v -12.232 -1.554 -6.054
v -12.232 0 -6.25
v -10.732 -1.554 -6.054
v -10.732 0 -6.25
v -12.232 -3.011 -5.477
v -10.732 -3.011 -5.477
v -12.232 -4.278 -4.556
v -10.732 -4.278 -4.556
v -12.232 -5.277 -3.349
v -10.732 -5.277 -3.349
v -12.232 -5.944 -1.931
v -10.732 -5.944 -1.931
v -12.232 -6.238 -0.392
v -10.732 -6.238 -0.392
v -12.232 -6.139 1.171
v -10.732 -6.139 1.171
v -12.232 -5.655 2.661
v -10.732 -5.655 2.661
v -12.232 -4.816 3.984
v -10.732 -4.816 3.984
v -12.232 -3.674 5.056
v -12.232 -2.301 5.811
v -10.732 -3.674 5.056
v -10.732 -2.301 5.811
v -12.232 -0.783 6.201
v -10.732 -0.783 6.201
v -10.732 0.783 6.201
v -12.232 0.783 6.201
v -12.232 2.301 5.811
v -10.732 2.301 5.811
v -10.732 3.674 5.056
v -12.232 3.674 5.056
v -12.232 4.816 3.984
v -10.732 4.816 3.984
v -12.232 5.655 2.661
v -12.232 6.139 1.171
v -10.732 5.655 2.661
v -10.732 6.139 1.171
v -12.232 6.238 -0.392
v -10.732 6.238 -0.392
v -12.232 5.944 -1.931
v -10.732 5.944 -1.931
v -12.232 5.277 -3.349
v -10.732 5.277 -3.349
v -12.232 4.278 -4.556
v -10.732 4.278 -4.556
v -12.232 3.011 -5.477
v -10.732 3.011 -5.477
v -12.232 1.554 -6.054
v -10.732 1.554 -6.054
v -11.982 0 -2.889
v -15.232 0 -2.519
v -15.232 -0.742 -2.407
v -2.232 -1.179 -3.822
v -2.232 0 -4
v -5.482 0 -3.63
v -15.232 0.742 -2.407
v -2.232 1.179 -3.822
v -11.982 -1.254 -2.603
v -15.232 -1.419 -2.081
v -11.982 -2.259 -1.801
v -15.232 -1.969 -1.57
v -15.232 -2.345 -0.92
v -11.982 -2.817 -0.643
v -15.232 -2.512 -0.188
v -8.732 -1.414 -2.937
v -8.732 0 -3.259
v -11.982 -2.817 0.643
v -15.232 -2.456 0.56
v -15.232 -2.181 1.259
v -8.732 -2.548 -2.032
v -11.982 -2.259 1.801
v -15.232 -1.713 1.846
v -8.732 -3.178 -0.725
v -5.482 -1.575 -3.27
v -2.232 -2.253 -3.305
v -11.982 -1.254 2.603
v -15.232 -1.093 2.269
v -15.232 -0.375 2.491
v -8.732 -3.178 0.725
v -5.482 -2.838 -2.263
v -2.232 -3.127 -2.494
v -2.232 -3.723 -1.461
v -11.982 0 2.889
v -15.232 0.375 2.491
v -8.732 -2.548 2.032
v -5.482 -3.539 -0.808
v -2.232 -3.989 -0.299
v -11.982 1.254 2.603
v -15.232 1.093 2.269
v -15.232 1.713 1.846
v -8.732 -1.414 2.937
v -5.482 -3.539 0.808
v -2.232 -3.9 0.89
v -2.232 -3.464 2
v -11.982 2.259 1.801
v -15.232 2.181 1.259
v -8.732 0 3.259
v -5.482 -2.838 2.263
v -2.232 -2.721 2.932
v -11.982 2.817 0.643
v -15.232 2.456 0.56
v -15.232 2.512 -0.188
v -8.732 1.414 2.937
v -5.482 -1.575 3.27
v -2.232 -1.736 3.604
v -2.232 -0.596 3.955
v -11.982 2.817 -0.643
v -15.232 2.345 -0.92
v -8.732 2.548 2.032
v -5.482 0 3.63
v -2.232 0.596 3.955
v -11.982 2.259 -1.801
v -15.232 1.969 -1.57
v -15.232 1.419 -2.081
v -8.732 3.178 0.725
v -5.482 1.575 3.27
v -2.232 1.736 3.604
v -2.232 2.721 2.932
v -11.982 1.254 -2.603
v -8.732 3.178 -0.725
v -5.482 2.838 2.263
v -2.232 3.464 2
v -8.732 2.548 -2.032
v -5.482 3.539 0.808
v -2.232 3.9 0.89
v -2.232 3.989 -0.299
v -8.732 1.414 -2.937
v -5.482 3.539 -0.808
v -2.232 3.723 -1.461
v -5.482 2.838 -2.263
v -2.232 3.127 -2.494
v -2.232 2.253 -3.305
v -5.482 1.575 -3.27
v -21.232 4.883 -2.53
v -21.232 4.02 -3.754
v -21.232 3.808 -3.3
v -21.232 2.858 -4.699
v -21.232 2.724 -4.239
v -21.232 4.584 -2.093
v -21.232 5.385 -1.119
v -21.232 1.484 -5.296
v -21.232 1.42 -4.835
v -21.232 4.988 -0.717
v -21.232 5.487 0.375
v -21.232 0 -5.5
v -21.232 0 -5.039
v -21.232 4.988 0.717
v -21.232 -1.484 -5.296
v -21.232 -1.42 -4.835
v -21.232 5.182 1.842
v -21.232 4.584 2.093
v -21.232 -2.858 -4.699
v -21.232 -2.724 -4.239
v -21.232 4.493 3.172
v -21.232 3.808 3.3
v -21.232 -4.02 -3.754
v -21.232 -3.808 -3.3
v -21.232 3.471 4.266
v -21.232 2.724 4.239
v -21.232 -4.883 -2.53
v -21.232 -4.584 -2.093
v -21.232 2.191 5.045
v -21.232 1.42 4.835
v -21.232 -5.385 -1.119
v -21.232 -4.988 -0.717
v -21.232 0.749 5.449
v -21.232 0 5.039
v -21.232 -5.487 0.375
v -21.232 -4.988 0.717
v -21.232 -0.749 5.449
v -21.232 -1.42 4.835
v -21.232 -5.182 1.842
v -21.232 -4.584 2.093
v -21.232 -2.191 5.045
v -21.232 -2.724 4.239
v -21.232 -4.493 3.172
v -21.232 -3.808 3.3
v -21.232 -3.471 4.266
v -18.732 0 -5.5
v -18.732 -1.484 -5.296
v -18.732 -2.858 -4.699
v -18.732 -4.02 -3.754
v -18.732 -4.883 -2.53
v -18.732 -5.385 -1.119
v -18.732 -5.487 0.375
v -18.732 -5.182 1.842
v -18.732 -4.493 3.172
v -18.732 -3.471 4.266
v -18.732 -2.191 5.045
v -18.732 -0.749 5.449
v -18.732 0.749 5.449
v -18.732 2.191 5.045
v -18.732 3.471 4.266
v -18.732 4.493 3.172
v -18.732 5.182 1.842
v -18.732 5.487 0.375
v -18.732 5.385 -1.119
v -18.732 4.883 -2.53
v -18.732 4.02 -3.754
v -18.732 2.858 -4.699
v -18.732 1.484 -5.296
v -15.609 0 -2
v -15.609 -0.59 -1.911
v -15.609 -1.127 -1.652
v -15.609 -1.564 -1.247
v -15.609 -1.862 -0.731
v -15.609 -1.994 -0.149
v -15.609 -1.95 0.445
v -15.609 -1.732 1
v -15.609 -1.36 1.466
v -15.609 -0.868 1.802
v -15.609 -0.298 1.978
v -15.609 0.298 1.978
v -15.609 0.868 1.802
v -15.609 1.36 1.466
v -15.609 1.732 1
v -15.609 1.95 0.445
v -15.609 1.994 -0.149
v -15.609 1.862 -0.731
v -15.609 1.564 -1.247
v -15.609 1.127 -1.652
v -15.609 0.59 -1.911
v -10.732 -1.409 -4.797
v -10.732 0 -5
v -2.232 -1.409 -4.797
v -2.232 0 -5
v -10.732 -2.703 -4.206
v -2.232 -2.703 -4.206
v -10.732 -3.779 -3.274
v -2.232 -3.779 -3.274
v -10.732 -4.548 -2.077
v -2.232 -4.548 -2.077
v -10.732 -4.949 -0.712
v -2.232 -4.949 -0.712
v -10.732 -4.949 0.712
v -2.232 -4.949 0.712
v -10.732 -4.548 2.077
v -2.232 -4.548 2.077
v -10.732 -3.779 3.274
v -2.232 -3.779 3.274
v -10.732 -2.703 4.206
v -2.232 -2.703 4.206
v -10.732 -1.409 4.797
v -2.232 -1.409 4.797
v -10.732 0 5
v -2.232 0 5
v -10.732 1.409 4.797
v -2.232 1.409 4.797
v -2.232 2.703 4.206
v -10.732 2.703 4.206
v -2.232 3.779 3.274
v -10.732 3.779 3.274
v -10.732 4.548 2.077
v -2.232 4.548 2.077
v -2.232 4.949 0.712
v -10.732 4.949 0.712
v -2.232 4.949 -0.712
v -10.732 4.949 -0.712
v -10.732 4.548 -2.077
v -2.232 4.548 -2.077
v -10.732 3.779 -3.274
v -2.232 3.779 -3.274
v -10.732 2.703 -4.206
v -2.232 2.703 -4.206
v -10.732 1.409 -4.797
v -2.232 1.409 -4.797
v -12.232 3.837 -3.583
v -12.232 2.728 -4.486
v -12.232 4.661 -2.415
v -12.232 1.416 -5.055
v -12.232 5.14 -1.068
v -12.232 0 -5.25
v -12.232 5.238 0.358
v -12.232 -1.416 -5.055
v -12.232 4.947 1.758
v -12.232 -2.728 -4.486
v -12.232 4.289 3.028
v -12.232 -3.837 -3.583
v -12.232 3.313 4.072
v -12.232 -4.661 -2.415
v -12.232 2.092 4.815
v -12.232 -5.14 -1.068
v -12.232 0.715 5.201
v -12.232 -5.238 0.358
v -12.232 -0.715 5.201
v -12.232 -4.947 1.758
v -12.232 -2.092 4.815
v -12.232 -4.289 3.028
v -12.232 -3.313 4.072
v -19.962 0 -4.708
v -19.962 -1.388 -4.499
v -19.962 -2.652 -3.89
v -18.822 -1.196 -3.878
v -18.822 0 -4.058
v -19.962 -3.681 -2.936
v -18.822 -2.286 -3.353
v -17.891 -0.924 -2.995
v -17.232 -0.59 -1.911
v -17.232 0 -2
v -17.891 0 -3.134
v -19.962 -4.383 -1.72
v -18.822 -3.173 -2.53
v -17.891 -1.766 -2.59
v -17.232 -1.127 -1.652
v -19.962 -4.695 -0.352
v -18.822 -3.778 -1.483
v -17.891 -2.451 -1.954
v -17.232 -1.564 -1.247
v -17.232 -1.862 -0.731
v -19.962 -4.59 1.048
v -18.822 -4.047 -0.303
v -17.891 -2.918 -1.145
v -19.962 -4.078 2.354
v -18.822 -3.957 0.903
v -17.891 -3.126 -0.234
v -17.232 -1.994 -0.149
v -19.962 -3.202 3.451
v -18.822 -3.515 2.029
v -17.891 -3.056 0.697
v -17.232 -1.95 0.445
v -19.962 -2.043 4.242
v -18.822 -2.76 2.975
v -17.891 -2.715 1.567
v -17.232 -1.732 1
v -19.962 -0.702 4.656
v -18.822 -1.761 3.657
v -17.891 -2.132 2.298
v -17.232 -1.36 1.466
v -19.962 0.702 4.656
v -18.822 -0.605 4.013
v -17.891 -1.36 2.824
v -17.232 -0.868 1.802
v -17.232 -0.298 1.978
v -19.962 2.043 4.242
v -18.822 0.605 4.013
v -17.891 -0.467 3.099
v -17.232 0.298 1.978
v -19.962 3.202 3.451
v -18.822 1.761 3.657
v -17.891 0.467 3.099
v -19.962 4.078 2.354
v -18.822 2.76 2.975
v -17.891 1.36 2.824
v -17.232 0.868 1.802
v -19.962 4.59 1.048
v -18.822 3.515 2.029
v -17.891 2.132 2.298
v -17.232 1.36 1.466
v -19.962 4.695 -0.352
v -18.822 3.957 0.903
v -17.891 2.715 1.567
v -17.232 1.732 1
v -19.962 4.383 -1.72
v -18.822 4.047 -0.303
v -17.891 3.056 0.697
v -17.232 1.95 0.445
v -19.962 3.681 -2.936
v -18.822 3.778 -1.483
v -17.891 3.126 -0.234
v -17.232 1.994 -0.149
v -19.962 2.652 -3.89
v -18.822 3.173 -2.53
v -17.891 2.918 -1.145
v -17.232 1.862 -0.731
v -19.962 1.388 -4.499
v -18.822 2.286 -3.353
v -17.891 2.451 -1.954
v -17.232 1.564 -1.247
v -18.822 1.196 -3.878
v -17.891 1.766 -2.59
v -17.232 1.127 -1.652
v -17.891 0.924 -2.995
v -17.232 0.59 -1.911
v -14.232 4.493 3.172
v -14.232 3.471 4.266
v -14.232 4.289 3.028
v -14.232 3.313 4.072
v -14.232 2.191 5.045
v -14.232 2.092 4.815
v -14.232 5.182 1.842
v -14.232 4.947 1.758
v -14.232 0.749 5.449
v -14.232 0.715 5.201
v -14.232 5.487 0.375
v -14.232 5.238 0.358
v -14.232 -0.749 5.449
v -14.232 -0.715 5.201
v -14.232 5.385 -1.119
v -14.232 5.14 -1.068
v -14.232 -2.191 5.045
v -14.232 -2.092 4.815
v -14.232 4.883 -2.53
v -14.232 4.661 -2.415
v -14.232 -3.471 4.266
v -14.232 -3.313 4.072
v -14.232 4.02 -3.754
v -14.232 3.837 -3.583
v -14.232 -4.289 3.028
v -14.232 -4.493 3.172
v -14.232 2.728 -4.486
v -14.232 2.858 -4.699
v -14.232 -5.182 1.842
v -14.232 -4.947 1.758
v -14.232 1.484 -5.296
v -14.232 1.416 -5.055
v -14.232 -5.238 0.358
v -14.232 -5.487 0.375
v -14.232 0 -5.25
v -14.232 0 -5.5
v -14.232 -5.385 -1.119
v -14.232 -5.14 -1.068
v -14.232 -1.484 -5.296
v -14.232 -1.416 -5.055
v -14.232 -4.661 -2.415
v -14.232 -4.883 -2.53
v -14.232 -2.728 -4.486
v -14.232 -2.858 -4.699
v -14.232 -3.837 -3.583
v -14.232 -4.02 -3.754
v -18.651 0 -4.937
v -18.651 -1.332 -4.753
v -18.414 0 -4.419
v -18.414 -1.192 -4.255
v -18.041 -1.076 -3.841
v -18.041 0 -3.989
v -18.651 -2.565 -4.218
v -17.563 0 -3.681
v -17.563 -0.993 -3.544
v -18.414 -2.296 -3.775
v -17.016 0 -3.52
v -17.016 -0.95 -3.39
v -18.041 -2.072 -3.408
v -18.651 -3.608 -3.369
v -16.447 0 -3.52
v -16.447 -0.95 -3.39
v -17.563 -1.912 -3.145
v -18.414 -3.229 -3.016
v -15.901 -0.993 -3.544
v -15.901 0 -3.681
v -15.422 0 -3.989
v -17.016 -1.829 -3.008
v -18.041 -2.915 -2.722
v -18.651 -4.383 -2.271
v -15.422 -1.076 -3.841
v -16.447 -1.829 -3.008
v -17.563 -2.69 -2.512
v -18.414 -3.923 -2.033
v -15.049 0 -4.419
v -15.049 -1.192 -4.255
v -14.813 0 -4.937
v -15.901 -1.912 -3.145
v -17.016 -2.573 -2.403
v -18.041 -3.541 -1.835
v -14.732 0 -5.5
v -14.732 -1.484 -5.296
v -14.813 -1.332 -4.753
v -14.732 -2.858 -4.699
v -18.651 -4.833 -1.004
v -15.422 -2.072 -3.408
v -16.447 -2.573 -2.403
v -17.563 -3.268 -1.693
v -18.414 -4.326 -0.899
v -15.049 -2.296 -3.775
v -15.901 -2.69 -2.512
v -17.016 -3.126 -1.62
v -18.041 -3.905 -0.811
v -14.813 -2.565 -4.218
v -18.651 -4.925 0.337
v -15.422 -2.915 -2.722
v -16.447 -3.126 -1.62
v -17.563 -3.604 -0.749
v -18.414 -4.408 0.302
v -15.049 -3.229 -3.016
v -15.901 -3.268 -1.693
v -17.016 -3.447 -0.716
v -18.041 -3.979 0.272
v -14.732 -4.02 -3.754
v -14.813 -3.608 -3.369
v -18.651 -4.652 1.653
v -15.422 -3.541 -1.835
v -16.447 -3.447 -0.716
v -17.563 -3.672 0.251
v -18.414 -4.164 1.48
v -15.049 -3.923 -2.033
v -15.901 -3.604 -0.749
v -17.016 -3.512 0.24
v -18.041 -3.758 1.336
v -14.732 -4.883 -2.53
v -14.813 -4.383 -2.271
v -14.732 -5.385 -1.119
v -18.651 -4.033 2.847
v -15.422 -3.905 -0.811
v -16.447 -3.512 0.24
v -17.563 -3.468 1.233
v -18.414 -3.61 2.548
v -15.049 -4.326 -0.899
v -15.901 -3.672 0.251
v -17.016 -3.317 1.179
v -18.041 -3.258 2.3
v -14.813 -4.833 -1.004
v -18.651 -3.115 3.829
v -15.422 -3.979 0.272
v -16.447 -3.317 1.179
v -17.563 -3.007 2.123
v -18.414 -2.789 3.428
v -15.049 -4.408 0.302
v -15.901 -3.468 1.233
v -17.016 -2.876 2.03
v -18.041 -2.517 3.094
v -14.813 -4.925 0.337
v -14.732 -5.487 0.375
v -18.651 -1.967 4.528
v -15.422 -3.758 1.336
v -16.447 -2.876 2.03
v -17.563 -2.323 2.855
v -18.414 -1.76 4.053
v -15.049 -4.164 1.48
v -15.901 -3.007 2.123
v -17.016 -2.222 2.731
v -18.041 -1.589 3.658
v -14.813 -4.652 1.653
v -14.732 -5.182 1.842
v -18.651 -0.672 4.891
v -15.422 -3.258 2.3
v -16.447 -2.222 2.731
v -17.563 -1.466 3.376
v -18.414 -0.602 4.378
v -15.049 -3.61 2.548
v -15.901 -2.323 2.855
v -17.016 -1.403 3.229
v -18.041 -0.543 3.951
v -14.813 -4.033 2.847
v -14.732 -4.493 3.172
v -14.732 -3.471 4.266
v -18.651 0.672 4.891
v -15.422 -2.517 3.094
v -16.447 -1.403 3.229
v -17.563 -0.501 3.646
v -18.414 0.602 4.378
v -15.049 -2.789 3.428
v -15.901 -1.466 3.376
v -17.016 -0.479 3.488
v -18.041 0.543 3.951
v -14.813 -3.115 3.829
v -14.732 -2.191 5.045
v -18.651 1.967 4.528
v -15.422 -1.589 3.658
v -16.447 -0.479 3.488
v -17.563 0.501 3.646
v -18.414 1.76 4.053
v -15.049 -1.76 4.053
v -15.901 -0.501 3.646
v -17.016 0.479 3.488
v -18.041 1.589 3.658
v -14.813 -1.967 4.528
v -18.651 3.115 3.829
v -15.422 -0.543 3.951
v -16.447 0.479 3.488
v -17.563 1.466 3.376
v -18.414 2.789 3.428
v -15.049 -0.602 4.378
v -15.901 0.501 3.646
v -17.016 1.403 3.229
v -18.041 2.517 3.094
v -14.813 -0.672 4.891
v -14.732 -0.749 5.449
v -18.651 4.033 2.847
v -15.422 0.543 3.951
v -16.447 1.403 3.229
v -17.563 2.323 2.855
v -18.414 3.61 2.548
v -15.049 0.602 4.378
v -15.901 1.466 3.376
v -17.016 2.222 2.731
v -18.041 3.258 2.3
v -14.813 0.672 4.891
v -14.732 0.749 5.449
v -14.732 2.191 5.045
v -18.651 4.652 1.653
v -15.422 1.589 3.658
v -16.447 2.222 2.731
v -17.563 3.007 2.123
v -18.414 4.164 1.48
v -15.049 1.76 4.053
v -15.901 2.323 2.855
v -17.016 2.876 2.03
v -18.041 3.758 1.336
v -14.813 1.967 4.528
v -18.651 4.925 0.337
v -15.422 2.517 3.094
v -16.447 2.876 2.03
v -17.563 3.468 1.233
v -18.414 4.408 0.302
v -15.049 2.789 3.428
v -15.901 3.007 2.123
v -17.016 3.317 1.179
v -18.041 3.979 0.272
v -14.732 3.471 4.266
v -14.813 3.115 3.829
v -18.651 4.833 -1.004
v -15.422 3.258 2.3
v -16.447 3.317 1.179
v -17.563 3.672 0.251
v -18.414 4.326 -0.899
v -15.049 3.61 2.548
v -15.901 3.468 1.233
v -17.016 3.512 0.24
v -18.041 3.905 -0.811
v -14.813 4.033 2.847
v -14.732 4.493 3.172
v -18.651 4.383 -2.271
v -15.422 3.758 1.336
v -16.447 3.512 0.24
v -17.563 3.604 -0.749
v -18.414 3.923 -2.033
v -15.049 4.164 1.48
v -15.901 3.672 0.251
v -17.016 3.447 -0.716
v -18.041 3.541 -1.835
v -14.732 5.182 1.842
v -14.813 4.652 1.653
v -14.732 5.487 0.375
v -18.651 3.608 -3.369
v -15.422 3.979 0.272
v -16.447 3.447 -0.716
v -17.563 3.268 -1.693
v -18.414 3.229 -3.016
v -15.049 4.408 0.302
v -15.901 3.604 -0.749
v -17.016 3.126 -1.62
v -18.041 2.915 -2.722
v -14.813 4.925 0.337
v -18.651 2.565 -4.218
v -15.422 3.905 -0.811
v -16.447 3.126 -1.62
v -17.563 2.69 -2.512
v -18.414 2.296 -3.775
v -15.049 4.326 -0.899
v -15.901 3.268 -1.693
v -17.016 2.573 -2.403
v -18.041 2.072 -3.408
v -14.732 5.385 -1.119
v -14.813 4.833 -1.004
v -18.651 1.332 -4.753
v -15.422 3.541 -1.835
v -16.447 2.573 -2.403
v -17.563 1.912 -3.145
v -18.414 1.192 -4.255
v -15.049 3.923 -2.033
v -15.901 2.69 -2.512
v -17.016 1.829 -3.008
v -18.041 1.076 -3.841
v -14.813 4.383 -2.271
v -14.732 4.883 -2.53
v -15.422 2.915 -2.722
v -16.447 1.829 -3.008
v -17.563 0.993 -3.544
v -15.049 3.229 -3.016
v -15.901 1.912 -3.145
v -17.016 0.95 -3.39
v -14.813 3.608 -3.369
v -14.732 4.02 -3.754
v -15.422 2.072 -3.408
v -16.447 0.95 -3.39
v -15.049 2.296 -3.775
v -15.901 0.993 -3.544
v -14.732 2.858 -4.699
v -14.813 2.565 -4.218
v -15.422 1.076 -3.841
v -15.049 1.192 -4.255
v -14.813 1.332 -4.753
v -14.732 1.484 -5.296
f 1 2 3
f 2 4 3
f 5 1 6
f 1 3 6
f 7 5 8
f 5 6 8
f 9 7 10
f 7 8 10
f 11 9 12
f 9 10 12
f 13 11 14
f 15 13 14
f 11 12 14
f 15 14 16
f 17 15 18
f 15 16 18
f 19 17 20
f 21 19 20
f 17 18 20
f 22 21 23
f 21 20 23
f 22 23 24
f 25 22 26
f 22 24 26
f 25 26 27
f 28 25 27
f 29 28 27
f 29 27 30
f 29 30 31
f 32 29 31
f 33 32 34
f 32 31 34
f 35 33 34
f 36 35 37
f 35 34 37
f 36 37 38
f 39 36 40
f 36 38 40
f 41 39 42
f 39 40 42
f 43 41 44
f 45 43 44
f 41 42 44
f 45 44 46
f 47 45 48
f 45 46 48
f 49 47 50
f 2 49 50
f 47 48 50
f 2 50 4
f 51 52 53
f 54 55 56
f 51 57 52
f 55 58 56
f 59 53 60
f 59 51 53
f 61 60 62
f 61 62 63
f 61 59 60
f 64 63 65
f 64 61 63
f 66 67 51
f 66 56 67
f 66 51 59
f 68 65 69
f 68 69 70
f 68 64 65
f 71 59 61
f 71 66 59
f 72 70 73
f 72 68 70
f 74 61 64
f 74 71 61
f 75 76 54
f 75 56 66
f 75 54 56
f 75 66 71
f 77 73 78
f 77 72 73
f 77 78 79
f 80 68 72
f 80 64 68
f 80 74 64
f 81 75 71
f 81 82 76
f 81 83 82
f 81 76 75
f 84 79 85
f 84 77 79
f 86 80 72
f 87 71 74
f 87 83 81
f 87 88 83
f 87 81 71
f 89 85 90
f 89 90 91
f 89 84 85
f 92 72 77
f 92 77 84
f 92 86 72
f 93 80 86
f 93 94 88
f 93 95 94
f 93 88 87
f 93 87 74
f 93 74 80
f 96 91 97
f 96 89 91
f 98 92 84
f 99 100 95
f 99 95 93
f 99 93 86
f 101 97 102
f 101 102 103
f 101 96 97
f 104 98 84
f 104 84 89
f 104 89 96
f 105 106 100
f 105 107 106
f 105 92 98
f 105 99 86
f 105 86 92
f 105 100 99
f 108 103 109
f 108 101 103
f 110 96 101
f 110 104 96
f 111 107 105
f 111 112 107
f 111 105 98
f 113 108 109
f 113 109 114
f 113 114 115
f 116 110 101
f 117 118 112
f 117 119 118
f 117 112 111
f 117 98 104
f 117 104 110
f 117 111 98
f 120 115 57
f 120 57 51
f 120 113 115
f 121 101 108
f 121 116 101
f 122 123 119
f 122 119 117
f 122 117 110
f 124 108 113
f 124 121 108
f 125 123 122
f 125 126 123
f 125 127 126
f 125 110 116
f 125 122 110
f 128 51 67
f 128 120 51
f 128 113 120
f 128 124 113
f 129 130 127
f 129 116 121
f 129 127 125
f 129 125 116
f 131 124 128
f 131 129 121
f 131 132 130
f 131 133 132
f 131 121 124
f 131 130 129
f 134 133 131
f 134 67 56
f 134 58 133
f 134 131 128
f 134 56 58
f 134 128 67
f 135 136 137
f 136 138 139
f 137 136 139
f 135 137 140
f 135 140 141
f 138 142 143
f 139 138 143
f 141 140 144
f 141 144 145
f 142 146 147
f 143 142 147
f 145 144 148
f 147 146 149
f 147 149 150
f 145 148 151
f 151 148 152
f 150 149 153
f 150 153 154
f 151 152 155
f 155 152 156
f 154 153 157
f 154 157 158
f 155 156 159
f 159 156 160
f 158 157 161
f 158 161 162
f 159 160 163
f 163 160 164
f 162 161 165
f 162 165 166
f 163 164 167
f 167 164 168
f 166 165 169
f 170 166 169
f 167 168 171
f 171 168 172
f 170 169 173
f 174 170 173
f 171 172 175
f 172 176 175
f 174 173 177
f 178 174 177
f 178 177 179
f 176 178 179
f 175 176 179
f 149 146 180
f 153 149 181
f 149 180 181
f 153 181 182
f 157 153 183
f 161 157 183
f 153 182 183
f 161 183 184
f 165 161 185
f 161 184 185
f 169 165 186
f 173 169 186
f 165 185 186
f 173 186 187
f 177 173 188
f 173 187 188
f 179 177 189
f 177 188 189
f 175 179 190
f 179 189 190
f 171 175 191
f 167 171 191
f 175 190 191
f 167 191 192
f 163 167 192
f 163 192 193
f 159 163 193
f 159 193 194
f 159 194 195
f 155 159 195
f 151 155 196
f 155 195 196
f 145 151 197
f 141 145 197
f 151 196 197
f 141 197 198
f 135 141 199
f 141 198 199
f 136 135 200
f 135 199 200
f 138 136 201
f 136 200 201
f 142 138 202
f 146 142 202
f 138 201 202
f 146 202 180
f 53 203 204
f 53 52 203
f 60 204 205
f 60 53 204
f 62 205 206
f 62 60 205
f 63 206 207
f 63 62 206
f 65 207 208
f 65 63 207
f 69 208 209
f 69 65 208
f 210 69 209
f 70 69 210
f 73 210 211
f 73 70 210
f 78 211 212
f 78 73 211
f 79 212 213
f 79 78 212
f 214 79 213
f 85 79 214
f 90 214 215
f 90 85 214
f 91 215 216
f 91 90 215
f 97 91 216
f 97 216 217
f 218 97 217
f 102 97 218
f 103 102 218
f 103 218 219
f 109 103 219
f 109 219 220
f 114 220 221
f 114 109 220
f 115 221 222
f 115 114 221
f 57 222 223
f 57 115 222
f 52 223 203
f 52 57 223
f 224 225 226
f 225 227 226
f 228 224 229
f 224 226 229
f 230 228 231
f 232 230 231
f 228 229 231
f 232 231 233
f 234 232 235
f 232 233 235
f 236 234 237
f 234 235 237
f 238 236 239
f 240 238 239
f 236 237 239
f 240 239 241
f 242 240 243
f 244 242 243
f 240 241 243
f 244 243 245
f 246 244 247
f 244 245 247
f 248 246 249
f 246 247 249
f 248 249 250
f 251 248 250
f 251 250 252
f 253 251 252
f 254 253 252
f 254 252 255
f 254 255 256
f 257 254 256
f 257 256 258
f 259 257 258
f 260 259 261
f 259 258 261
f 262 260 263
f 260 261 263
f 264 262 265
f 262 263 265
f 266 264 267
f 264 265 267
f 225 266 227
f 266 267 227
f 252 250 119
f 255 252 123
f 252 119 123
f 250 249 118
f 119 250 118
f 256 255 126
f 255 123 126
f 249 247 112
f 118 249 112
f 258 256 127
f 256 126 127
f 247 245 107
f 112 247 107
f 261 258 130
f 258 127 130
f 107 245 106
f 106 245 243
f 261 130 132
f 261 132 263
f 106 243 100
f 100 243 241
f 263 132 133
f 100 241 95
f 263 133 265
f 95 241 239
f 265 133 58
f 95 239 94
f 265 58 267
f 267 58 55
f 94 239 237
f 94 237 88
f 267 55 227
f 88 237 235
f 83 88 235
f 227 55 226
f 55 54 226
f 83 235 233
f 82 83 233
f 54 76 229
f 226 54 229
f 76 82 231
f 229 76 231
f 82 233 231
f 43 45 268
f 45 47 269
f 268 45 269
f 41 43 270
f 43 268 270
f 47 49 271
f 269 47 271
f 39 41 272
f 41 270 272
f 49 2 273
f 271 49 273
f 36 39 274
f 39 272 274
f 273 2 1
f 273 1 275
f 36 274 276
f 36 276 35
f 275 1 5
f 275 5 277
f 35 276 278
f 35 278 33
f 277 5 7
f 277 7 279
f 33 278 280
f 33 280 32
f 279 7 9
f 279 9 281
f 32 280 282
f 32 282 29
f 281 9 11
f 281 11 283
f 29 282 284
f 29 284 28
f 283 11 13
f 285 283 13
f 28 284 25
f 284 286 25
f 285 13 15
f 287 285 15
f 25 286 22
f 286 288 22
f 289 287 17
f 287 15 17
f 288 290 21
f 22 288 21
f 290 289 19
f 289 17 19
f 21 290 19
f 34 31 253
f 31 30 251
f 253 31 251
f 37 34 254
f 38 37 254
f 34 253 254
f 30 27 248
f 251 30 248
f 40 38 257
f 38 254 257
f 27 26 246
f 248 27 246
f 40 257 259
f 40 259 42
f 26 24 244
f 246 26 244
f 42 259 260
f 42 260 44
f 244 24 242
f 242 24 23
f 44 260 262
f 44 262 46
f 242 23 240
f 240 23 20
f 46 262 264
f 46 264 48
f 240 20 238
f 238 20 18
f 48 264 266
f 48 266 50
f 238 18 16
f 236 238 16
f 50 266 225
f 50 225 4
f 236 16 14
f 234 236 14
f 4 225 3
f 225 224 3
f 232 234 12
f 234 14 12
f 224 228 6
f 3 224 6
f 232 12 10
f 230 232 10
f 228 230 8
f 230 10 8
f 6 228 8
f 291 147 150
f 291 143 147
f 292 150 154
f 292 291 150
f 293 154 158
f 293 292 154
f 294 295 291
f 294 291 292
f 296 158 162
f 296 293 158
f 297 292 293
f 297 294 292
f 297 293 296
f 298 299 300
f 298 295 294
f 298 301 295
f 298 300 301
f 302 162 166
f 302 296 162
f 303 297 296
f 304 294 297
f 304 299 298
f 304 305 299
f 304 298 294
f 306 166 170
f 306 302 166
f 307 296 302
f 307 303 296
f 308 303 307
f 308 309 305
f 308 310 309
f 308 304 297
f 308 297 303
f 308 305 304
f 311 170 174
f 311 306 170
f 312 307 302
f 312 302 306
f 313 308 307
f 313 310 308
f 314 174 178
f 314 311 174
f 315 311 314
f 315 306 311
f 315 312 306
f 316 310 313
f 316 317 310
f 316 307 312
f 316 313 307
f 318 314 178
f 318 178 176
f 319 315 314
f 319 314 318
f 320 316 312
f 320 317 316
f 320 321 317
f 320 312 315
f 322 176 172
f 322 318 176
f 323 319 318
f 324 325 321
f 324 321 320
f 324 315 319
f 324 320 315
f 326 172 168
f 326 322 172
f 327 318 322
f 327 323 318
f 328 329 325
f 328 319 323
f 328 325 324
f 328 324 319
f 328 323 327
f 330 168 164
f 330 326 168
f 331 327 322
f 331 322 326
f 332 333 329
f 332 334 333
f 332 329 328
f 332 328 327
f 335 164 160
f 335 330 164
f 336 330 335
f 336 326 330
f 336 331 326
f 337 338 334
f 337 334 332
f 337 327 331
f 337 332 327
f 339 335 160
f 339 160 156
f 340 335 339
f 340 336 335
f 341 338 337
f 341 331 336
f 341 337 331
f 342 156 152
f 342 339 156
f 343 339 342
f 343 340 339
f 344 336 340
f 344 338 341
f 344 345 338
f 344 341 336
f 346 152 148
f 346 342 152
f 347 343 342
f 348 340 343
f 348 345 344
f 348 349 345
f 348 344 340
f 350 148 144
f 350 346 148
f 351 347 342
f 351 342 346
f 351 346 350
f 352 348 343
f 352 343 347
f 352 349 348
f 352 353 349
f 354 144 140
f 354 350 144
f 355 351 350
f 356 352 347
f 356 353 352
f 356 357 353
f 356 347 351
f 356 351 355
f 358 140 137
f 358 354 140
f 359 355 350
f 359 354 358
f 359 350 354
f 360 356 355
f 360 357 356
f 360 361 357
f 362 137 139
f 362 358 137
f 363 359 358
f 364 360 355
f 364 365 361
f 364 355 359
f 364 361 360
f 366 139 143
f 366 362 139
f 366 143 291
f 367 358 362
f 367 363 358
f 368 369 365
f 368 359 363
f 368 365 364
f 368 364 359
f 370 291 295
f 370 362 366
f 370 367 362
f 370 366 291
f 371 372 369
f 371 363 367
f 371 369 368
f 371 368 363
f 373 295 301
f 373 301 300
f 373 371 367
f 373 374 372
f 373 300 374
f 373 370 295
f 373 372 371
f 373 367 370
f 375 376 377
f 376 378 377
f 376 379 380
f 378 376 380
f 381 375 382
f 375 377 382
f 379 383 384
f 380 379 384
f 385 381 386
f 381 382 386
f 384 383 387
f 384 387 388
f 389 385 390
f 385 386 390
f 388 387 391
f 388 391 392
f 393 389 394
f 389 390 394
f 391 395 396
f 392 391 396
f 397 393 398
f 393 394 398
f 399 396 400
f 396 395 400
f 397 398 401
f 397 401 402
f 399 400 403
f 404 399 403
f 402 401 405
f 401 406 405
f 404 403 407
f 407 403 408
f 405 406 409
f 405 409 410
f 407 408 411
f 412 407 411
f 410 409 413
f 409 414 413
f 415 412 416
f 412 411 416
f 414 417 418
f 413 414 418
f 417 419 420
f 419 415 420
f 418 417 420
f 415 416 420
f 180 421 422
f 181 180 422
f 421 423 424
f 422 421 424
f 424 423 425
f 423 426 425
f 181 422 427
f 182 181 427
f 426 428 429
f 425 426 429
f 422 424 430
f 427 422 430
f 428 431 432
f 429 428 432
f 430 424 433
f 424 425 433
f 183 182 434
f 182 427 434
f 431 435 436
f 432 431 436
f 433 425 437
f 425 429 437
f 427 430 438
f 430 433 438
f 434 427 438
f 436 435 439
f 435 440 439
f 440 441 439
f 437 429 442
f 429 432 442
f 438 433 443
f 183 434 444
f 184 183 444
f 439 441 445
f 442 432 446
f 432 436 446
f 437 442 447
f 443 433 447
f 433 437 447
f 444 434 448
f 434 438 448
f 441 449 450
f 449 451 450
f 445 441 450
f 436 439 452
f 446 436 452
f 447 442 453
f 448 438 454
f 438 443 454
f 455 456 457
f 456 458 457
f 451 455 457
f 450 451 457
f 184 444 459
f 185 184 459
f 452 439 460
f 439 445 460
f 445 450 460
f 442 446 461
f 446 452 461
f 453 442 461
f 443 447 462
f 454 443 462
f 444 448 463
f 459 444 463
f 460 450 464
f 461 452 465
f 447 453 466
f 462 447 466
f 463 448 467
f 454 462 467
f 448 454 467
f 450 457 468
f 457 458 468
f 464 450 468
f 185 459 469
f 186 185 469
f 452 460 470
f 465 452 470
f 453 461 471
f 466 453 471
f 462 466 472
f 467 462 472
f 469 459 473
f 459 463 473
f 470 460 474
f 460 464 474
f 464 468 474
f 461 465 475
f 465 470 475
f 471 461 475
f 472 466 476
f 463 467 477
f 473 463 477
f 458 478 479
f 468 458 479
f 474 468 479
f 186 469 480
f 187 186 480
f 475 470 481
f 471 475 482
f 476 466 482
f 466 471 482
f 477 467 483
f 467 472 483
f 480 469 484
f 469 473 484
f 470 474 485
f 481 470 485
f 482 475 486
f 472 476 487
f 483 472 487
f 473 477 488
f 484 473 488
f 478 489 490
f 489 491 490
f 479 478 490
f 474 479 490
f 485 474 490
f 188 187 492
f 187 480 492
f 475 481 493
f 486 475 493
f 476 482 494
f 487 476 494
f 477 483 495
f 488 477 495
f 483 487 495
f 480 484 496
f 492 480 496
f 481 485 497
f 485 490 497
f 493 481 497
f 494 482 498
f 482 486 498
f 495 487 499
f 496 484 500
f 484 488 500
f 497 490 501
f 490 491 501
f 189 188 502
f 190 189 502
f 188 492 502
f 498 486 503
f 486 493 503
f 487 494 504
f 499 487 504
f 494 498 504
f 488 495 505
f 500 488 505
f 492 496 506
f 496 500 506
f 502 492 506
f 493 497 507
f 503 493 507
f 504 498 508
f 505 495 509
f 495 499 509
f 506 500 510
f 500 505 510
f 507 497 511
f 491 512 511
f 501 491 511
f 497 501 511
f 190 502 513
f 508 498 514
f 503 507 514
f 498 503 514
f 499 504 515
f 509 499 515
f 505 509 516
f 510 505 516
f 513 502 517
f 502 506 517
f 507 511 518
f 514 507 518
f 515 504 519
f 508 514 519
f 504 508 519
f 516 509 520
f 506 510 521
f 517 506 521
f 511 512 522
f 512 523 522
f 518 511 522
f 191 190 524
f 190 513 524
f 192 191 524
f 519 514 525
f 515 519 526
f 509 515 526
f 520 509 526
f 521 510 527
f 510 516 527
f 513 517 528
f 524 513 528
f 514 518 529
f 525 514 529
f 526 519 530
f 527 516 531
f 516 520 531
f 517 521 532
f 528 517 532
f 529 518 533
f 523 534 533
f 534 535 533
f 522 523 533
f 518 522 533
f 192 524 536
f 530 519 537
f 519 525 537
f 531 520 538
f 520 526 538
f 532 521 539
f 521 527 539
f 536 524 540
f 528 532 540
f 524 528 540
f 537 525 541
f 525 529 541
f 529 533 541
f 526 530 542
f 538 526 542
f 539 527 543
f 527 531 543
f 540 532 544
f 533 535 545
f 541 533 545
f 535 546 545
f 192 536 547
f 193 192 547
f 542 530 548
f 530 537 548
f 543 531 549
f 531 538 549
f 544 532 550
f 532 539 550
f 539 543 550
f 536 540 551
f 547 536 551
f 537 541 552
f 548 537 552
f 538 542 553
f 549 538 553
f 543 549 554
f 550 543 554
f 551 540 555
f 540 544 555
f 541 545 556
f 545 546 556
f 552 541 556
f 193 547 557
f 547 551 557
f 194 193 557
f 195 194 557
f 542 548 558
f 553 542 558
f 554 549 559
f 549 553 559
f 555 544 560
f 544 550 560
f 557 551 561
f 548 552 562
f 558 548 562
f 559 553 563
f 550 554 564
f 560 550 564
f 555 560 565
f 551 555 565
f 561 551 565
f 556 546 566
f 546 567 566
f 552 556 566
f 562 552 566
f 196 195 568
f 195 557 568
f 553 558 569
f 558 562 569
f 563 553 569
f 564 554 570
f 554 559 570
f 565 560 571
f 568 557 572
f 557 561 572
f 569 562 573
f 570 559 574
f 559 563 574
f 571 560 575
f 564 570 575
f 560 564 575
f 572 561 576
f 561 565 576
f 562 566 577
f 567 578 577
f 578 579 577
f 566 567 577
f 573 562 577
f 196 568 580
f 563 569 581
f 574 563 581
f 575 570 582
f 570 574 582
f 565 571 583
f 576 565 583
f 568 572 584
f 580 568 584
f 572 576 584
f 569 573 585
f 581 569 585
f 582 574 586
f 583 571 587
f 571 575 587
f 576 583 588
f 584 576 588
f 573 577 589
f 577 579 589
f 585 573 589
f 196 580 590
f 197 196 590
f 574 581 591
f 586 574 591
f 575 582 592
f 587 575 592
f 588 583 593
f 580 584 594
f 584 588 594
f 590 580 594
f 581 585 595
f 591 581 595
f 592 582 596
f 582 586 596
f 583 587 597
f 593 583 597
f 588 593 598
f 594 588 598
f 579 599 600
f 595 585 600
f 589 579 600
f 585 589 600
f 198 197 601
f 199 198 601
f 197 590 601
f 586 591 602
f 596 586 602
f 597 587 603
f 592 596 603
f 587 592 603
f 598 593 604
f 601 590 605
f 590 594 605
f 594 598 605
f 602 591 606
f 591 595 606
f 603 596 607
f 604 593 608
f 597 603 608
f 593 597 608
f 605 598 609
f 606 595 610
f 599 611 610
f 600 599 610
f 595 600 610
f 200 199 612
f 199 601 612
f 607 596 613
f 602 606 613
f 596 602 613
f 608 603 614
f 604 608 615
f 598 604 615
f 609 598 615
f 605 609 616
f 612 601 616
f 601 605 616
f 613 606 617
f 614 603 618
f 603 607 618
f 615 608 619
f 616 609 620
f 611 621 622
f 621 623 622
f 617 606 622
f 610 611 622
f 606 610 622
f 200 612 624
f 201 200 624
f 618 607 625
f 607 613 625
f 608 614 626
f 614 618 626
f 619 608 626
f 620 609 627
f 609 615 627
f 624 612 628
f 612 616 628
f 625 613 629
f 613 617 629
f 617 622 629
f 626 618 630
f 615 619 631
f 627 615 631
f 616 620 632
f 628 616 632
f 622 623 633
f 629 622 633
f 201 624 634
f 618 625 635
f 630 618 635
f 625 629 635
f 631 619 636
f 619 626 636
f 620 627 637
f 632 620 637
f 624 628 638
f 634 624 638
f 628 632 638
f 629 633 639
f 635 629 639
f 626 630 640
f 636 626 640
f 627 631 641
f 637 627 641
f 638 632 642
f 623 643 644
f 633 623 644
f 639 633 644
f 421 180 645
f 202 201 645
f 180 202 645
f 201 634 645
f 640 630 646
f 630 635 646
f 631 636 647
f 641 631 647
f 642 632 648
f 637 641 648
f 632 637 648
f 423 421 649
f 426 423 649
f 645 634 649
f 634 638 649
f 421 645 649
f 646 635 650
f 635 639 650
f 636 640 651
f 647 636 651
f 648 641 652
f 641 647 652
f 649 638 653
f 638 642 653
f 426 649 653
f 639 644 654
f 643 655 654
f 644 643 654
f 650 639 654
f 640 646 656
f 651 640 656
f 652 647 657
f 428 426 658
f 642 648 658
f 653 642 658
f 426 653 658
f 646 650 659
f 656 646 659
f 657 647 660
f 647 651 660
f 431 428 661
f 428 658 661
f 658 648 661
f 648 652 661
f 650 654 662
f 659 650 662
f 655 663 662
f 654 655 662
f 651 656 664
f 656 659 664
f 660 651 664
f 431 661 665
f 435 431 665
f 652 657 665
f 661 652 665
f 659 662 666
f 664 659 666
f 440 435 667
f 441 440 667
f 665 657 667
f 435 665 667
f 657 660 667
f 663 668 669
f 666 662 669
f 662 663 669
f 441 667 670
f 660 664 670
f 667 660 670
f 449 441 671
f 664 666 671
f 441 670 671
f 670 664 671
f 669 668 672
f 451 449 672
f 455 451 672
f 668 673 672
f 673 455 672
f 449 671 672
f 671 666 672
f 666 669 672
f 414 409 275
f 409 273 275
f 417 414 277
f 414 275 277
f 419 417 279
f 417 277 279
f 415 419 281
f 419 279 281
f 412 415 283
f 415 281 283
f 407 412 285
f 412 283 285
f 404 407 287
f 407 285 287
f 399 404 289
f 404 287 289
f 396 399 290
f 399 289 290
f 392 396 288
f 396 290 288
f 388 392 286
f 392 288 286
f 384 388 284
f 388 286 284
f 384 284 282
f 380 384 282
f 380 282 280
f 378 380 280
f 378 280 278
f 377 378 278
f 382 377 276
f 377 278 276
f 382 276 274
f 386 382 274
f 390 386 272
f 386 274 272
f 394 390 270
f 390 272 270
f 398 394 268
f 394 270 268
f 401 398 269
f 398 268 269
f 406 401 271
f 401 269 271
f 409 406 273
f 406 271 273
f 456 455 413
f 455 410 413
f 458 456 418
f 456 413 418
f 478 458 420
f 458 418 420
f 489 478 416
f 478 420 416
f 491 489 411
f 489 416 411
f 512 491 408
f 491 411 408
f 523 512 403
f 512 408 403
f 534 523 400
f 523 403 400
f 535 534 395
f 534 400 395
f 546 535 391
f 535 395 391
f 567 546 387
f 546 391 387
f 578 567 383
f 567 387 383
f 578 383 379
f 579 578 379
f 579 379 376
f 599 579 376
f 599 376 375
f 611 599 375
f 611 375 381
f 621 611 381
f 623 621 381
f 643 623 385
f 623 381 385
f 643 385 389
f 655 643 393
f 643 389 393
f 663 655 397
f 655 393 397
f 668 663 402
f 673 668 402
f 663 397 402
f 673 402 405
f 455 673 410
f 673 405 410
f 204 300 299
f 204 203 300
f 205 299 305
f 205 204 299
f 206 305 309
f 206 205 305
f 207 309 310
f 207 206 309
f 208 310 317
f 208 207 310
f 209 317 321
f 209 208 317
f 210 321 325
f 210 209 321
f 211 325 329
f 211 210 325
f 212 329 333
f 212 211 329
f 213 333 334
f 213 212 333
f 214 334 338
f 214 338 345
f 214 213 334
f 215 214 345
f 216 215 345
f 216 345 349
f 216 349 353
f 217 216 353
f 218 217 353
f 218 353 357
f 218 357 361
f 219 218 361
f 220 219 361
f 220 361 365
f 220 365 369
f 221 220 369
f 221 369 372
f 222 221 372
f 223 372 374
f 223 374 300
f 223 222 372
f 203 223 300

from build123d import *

# Parameters (mm, degrees)
SKETCH_2_R = 2


with BuildPart() as part:
    # Эскиз1 → Повернуть1 (revolve)
    with BuildSketch(Plane.XY, mode=Mode.PRIVATE) as revolve_1_sk:
        Polygon((-2.231746032, 0), (-21.231746032, 0), (-21.231746032, 5.5), (-14.231746032, 5.5), (-14.231746032, 5.25), (-12.231746032, 5.25), (-12.231746032, 6.25), (-10.731746032, 6.25), (-10.731746032, 5), (-2.231746032, 5), align=None)
    revolve(revolve_1_sk.sketch.rotate(Axis((-2.231746032, 0, 0), (-1, 0, 0)), 90), axis=Axis((-2.231746032, 0, 0), (-1, 0, 0)))

    # Эскиз2 → Вырез-Повернуть2 (revolve, cut)
    with BuildSketch(Plane.XY, mode=Mode.PRIVATE) as cut_revolve_2_sk:
        with Locations((-16.731746032, 5.5)):
            Circle(SKETCH_2_R)
        with BuildLine():
            Line((-2.231746032, 0), (-21.231746032, 0))
            Line((-21.231746032, 0), (-21.231746032, 5.039277614))
            ThreePointArc((-21.231746032, 5.039277614), (-18.822332125, 4.058469356), (-17.231746032, 2))
            Line((-17.231746032, 2), (-15.608822853, 2))
            Line((-15.608822853, 2), (-15.231746032, 2.518837092))
            Line((-15.231746032, 2.518837092), (-2.231746032, 4))
            Line((-2.231746032, 4), (-2.231746032, 0))
        make_face()
    revolve(cut_revolve_2_sk.sketch.rotate(Axis((-2.231746032, 0, 0), (-1, 0, 0)), 90), axis=Axis((-2.231746032, 0, 0), (-1, 0, 0)), mode=Mode.SUBTRACT)


solid = part.part
